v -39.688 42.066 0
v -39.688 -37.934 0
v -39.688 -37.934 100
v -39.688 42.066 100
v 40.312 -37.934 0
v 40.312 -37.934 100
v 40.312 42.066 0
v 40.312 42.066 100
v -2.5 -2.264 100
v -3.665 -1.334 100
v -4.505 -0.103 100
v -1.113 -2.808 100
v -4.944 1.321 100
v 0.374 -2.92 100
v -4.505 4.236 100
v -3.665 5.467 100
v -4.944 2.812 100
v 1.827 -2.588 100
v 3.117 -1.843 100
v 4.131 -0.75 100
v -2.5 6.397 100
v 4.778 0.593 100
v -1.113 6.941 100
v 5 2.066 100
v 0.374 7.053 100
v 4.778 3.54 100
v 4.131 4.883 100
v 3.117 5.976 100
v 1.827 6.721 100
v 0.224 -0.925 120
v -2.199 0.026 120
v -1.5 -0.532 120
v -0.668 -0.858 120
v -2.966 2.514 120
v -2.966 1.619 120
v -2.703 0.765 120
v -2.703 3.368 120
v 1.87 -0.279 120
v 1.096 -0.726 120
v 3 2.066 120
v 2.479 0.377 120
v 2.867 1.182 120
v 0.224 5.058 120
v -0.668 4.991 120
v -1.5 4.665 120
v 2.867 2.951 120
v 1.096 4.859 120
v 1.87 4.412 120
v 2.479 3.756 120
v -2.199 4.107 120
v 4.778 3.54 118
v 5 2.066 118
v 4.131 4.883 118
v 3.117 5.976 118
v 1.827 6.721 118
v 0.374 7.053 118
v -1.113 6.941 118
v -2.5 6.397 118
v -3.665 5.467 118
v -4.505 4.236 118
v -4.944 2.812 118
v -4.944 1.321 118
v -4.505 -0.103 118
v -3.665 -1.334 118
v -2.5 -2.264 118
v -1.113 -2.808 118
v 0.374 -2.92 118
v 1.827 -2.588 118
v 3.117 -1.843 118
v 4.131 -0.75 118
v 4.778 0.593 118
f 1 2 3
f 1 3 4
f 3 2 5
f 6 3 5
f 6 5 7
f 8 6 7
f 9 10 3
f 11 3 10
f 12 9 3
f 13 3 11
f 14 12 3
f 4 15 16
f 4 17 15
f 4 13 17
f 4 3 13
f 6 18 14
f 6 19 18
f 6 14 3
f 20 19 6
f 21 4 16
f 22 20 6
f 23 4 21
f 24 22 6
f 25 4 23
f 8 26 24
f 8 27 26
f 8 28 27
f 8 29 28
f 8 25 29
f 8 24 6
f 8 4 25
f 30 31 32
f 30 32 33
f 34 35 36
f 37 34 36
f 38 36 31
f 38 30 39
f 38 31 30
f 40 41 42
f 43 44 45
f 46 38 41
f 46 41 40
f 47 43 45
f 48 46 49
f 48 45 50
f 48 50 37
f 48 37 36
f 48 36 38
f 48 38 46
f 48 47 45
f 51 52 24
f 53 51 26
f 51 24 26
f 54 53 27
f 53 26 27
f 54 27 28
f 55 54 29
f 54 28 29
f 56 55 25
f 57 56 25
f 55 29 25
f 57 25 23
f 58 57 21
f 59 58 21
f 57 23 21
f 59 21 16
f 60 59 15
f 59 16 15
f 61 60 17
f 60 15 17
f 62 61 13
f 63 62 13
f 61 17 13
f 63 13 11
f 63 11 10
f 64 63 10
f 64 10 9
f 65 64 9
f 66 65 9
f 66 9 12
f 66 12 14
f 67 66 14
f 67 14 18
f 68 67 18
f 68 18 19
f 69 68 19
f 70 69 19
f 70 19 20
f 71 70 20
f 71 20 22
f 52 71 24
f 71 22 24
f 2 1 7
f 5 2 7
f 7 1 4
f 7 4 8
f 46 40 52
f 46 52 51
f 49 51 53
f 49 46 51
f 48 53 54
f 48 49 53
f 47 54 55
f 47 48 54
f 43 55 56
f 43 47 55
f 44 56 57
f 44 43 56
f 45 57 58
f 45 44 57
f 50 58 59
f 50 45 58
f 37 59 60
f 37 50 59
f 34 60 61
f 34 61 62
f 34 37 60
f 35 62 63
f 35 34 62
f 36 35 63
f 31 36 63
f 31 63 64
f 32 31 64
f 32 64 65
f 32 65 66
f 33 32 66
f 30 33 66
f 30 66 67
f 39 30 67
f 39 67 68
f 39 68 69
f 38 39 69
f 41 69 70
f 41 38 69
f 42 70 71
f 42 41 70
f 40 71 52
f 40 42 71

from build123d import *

# Parameters (mm, degrees)
F0_W     = 80
F0_H     = 80
F1_DEPTH = 100
F2_R     = 5
F3_DEPTH = 20
F4_SIZE  = 2


with BuildPart() as f1:
    # F0 (on Top) → F1 (new body)
    with BuildSketch(Plane.XY):
        with Locations((0.311533, 2.066482)):
            Rectangle(F0_W, F0_H)
    extrude(amount=F1_DEPTH)

    # F2 (on face) → F3 (join)
    with BuildSketch(Plane.XY.offset(100)):
        with Locations((0, 2.066482)):
            Circle(F2_R)
    extrude(amount=F3_DEPTH)

    # F4
    f4_edges = [f1.edges().sort_by_distance(p)[0] for p in [
        (-5, 2.066482, 120),
    ]]
    chamfer(f4_edges, length=F4_SIZE)


solid = f1.part
